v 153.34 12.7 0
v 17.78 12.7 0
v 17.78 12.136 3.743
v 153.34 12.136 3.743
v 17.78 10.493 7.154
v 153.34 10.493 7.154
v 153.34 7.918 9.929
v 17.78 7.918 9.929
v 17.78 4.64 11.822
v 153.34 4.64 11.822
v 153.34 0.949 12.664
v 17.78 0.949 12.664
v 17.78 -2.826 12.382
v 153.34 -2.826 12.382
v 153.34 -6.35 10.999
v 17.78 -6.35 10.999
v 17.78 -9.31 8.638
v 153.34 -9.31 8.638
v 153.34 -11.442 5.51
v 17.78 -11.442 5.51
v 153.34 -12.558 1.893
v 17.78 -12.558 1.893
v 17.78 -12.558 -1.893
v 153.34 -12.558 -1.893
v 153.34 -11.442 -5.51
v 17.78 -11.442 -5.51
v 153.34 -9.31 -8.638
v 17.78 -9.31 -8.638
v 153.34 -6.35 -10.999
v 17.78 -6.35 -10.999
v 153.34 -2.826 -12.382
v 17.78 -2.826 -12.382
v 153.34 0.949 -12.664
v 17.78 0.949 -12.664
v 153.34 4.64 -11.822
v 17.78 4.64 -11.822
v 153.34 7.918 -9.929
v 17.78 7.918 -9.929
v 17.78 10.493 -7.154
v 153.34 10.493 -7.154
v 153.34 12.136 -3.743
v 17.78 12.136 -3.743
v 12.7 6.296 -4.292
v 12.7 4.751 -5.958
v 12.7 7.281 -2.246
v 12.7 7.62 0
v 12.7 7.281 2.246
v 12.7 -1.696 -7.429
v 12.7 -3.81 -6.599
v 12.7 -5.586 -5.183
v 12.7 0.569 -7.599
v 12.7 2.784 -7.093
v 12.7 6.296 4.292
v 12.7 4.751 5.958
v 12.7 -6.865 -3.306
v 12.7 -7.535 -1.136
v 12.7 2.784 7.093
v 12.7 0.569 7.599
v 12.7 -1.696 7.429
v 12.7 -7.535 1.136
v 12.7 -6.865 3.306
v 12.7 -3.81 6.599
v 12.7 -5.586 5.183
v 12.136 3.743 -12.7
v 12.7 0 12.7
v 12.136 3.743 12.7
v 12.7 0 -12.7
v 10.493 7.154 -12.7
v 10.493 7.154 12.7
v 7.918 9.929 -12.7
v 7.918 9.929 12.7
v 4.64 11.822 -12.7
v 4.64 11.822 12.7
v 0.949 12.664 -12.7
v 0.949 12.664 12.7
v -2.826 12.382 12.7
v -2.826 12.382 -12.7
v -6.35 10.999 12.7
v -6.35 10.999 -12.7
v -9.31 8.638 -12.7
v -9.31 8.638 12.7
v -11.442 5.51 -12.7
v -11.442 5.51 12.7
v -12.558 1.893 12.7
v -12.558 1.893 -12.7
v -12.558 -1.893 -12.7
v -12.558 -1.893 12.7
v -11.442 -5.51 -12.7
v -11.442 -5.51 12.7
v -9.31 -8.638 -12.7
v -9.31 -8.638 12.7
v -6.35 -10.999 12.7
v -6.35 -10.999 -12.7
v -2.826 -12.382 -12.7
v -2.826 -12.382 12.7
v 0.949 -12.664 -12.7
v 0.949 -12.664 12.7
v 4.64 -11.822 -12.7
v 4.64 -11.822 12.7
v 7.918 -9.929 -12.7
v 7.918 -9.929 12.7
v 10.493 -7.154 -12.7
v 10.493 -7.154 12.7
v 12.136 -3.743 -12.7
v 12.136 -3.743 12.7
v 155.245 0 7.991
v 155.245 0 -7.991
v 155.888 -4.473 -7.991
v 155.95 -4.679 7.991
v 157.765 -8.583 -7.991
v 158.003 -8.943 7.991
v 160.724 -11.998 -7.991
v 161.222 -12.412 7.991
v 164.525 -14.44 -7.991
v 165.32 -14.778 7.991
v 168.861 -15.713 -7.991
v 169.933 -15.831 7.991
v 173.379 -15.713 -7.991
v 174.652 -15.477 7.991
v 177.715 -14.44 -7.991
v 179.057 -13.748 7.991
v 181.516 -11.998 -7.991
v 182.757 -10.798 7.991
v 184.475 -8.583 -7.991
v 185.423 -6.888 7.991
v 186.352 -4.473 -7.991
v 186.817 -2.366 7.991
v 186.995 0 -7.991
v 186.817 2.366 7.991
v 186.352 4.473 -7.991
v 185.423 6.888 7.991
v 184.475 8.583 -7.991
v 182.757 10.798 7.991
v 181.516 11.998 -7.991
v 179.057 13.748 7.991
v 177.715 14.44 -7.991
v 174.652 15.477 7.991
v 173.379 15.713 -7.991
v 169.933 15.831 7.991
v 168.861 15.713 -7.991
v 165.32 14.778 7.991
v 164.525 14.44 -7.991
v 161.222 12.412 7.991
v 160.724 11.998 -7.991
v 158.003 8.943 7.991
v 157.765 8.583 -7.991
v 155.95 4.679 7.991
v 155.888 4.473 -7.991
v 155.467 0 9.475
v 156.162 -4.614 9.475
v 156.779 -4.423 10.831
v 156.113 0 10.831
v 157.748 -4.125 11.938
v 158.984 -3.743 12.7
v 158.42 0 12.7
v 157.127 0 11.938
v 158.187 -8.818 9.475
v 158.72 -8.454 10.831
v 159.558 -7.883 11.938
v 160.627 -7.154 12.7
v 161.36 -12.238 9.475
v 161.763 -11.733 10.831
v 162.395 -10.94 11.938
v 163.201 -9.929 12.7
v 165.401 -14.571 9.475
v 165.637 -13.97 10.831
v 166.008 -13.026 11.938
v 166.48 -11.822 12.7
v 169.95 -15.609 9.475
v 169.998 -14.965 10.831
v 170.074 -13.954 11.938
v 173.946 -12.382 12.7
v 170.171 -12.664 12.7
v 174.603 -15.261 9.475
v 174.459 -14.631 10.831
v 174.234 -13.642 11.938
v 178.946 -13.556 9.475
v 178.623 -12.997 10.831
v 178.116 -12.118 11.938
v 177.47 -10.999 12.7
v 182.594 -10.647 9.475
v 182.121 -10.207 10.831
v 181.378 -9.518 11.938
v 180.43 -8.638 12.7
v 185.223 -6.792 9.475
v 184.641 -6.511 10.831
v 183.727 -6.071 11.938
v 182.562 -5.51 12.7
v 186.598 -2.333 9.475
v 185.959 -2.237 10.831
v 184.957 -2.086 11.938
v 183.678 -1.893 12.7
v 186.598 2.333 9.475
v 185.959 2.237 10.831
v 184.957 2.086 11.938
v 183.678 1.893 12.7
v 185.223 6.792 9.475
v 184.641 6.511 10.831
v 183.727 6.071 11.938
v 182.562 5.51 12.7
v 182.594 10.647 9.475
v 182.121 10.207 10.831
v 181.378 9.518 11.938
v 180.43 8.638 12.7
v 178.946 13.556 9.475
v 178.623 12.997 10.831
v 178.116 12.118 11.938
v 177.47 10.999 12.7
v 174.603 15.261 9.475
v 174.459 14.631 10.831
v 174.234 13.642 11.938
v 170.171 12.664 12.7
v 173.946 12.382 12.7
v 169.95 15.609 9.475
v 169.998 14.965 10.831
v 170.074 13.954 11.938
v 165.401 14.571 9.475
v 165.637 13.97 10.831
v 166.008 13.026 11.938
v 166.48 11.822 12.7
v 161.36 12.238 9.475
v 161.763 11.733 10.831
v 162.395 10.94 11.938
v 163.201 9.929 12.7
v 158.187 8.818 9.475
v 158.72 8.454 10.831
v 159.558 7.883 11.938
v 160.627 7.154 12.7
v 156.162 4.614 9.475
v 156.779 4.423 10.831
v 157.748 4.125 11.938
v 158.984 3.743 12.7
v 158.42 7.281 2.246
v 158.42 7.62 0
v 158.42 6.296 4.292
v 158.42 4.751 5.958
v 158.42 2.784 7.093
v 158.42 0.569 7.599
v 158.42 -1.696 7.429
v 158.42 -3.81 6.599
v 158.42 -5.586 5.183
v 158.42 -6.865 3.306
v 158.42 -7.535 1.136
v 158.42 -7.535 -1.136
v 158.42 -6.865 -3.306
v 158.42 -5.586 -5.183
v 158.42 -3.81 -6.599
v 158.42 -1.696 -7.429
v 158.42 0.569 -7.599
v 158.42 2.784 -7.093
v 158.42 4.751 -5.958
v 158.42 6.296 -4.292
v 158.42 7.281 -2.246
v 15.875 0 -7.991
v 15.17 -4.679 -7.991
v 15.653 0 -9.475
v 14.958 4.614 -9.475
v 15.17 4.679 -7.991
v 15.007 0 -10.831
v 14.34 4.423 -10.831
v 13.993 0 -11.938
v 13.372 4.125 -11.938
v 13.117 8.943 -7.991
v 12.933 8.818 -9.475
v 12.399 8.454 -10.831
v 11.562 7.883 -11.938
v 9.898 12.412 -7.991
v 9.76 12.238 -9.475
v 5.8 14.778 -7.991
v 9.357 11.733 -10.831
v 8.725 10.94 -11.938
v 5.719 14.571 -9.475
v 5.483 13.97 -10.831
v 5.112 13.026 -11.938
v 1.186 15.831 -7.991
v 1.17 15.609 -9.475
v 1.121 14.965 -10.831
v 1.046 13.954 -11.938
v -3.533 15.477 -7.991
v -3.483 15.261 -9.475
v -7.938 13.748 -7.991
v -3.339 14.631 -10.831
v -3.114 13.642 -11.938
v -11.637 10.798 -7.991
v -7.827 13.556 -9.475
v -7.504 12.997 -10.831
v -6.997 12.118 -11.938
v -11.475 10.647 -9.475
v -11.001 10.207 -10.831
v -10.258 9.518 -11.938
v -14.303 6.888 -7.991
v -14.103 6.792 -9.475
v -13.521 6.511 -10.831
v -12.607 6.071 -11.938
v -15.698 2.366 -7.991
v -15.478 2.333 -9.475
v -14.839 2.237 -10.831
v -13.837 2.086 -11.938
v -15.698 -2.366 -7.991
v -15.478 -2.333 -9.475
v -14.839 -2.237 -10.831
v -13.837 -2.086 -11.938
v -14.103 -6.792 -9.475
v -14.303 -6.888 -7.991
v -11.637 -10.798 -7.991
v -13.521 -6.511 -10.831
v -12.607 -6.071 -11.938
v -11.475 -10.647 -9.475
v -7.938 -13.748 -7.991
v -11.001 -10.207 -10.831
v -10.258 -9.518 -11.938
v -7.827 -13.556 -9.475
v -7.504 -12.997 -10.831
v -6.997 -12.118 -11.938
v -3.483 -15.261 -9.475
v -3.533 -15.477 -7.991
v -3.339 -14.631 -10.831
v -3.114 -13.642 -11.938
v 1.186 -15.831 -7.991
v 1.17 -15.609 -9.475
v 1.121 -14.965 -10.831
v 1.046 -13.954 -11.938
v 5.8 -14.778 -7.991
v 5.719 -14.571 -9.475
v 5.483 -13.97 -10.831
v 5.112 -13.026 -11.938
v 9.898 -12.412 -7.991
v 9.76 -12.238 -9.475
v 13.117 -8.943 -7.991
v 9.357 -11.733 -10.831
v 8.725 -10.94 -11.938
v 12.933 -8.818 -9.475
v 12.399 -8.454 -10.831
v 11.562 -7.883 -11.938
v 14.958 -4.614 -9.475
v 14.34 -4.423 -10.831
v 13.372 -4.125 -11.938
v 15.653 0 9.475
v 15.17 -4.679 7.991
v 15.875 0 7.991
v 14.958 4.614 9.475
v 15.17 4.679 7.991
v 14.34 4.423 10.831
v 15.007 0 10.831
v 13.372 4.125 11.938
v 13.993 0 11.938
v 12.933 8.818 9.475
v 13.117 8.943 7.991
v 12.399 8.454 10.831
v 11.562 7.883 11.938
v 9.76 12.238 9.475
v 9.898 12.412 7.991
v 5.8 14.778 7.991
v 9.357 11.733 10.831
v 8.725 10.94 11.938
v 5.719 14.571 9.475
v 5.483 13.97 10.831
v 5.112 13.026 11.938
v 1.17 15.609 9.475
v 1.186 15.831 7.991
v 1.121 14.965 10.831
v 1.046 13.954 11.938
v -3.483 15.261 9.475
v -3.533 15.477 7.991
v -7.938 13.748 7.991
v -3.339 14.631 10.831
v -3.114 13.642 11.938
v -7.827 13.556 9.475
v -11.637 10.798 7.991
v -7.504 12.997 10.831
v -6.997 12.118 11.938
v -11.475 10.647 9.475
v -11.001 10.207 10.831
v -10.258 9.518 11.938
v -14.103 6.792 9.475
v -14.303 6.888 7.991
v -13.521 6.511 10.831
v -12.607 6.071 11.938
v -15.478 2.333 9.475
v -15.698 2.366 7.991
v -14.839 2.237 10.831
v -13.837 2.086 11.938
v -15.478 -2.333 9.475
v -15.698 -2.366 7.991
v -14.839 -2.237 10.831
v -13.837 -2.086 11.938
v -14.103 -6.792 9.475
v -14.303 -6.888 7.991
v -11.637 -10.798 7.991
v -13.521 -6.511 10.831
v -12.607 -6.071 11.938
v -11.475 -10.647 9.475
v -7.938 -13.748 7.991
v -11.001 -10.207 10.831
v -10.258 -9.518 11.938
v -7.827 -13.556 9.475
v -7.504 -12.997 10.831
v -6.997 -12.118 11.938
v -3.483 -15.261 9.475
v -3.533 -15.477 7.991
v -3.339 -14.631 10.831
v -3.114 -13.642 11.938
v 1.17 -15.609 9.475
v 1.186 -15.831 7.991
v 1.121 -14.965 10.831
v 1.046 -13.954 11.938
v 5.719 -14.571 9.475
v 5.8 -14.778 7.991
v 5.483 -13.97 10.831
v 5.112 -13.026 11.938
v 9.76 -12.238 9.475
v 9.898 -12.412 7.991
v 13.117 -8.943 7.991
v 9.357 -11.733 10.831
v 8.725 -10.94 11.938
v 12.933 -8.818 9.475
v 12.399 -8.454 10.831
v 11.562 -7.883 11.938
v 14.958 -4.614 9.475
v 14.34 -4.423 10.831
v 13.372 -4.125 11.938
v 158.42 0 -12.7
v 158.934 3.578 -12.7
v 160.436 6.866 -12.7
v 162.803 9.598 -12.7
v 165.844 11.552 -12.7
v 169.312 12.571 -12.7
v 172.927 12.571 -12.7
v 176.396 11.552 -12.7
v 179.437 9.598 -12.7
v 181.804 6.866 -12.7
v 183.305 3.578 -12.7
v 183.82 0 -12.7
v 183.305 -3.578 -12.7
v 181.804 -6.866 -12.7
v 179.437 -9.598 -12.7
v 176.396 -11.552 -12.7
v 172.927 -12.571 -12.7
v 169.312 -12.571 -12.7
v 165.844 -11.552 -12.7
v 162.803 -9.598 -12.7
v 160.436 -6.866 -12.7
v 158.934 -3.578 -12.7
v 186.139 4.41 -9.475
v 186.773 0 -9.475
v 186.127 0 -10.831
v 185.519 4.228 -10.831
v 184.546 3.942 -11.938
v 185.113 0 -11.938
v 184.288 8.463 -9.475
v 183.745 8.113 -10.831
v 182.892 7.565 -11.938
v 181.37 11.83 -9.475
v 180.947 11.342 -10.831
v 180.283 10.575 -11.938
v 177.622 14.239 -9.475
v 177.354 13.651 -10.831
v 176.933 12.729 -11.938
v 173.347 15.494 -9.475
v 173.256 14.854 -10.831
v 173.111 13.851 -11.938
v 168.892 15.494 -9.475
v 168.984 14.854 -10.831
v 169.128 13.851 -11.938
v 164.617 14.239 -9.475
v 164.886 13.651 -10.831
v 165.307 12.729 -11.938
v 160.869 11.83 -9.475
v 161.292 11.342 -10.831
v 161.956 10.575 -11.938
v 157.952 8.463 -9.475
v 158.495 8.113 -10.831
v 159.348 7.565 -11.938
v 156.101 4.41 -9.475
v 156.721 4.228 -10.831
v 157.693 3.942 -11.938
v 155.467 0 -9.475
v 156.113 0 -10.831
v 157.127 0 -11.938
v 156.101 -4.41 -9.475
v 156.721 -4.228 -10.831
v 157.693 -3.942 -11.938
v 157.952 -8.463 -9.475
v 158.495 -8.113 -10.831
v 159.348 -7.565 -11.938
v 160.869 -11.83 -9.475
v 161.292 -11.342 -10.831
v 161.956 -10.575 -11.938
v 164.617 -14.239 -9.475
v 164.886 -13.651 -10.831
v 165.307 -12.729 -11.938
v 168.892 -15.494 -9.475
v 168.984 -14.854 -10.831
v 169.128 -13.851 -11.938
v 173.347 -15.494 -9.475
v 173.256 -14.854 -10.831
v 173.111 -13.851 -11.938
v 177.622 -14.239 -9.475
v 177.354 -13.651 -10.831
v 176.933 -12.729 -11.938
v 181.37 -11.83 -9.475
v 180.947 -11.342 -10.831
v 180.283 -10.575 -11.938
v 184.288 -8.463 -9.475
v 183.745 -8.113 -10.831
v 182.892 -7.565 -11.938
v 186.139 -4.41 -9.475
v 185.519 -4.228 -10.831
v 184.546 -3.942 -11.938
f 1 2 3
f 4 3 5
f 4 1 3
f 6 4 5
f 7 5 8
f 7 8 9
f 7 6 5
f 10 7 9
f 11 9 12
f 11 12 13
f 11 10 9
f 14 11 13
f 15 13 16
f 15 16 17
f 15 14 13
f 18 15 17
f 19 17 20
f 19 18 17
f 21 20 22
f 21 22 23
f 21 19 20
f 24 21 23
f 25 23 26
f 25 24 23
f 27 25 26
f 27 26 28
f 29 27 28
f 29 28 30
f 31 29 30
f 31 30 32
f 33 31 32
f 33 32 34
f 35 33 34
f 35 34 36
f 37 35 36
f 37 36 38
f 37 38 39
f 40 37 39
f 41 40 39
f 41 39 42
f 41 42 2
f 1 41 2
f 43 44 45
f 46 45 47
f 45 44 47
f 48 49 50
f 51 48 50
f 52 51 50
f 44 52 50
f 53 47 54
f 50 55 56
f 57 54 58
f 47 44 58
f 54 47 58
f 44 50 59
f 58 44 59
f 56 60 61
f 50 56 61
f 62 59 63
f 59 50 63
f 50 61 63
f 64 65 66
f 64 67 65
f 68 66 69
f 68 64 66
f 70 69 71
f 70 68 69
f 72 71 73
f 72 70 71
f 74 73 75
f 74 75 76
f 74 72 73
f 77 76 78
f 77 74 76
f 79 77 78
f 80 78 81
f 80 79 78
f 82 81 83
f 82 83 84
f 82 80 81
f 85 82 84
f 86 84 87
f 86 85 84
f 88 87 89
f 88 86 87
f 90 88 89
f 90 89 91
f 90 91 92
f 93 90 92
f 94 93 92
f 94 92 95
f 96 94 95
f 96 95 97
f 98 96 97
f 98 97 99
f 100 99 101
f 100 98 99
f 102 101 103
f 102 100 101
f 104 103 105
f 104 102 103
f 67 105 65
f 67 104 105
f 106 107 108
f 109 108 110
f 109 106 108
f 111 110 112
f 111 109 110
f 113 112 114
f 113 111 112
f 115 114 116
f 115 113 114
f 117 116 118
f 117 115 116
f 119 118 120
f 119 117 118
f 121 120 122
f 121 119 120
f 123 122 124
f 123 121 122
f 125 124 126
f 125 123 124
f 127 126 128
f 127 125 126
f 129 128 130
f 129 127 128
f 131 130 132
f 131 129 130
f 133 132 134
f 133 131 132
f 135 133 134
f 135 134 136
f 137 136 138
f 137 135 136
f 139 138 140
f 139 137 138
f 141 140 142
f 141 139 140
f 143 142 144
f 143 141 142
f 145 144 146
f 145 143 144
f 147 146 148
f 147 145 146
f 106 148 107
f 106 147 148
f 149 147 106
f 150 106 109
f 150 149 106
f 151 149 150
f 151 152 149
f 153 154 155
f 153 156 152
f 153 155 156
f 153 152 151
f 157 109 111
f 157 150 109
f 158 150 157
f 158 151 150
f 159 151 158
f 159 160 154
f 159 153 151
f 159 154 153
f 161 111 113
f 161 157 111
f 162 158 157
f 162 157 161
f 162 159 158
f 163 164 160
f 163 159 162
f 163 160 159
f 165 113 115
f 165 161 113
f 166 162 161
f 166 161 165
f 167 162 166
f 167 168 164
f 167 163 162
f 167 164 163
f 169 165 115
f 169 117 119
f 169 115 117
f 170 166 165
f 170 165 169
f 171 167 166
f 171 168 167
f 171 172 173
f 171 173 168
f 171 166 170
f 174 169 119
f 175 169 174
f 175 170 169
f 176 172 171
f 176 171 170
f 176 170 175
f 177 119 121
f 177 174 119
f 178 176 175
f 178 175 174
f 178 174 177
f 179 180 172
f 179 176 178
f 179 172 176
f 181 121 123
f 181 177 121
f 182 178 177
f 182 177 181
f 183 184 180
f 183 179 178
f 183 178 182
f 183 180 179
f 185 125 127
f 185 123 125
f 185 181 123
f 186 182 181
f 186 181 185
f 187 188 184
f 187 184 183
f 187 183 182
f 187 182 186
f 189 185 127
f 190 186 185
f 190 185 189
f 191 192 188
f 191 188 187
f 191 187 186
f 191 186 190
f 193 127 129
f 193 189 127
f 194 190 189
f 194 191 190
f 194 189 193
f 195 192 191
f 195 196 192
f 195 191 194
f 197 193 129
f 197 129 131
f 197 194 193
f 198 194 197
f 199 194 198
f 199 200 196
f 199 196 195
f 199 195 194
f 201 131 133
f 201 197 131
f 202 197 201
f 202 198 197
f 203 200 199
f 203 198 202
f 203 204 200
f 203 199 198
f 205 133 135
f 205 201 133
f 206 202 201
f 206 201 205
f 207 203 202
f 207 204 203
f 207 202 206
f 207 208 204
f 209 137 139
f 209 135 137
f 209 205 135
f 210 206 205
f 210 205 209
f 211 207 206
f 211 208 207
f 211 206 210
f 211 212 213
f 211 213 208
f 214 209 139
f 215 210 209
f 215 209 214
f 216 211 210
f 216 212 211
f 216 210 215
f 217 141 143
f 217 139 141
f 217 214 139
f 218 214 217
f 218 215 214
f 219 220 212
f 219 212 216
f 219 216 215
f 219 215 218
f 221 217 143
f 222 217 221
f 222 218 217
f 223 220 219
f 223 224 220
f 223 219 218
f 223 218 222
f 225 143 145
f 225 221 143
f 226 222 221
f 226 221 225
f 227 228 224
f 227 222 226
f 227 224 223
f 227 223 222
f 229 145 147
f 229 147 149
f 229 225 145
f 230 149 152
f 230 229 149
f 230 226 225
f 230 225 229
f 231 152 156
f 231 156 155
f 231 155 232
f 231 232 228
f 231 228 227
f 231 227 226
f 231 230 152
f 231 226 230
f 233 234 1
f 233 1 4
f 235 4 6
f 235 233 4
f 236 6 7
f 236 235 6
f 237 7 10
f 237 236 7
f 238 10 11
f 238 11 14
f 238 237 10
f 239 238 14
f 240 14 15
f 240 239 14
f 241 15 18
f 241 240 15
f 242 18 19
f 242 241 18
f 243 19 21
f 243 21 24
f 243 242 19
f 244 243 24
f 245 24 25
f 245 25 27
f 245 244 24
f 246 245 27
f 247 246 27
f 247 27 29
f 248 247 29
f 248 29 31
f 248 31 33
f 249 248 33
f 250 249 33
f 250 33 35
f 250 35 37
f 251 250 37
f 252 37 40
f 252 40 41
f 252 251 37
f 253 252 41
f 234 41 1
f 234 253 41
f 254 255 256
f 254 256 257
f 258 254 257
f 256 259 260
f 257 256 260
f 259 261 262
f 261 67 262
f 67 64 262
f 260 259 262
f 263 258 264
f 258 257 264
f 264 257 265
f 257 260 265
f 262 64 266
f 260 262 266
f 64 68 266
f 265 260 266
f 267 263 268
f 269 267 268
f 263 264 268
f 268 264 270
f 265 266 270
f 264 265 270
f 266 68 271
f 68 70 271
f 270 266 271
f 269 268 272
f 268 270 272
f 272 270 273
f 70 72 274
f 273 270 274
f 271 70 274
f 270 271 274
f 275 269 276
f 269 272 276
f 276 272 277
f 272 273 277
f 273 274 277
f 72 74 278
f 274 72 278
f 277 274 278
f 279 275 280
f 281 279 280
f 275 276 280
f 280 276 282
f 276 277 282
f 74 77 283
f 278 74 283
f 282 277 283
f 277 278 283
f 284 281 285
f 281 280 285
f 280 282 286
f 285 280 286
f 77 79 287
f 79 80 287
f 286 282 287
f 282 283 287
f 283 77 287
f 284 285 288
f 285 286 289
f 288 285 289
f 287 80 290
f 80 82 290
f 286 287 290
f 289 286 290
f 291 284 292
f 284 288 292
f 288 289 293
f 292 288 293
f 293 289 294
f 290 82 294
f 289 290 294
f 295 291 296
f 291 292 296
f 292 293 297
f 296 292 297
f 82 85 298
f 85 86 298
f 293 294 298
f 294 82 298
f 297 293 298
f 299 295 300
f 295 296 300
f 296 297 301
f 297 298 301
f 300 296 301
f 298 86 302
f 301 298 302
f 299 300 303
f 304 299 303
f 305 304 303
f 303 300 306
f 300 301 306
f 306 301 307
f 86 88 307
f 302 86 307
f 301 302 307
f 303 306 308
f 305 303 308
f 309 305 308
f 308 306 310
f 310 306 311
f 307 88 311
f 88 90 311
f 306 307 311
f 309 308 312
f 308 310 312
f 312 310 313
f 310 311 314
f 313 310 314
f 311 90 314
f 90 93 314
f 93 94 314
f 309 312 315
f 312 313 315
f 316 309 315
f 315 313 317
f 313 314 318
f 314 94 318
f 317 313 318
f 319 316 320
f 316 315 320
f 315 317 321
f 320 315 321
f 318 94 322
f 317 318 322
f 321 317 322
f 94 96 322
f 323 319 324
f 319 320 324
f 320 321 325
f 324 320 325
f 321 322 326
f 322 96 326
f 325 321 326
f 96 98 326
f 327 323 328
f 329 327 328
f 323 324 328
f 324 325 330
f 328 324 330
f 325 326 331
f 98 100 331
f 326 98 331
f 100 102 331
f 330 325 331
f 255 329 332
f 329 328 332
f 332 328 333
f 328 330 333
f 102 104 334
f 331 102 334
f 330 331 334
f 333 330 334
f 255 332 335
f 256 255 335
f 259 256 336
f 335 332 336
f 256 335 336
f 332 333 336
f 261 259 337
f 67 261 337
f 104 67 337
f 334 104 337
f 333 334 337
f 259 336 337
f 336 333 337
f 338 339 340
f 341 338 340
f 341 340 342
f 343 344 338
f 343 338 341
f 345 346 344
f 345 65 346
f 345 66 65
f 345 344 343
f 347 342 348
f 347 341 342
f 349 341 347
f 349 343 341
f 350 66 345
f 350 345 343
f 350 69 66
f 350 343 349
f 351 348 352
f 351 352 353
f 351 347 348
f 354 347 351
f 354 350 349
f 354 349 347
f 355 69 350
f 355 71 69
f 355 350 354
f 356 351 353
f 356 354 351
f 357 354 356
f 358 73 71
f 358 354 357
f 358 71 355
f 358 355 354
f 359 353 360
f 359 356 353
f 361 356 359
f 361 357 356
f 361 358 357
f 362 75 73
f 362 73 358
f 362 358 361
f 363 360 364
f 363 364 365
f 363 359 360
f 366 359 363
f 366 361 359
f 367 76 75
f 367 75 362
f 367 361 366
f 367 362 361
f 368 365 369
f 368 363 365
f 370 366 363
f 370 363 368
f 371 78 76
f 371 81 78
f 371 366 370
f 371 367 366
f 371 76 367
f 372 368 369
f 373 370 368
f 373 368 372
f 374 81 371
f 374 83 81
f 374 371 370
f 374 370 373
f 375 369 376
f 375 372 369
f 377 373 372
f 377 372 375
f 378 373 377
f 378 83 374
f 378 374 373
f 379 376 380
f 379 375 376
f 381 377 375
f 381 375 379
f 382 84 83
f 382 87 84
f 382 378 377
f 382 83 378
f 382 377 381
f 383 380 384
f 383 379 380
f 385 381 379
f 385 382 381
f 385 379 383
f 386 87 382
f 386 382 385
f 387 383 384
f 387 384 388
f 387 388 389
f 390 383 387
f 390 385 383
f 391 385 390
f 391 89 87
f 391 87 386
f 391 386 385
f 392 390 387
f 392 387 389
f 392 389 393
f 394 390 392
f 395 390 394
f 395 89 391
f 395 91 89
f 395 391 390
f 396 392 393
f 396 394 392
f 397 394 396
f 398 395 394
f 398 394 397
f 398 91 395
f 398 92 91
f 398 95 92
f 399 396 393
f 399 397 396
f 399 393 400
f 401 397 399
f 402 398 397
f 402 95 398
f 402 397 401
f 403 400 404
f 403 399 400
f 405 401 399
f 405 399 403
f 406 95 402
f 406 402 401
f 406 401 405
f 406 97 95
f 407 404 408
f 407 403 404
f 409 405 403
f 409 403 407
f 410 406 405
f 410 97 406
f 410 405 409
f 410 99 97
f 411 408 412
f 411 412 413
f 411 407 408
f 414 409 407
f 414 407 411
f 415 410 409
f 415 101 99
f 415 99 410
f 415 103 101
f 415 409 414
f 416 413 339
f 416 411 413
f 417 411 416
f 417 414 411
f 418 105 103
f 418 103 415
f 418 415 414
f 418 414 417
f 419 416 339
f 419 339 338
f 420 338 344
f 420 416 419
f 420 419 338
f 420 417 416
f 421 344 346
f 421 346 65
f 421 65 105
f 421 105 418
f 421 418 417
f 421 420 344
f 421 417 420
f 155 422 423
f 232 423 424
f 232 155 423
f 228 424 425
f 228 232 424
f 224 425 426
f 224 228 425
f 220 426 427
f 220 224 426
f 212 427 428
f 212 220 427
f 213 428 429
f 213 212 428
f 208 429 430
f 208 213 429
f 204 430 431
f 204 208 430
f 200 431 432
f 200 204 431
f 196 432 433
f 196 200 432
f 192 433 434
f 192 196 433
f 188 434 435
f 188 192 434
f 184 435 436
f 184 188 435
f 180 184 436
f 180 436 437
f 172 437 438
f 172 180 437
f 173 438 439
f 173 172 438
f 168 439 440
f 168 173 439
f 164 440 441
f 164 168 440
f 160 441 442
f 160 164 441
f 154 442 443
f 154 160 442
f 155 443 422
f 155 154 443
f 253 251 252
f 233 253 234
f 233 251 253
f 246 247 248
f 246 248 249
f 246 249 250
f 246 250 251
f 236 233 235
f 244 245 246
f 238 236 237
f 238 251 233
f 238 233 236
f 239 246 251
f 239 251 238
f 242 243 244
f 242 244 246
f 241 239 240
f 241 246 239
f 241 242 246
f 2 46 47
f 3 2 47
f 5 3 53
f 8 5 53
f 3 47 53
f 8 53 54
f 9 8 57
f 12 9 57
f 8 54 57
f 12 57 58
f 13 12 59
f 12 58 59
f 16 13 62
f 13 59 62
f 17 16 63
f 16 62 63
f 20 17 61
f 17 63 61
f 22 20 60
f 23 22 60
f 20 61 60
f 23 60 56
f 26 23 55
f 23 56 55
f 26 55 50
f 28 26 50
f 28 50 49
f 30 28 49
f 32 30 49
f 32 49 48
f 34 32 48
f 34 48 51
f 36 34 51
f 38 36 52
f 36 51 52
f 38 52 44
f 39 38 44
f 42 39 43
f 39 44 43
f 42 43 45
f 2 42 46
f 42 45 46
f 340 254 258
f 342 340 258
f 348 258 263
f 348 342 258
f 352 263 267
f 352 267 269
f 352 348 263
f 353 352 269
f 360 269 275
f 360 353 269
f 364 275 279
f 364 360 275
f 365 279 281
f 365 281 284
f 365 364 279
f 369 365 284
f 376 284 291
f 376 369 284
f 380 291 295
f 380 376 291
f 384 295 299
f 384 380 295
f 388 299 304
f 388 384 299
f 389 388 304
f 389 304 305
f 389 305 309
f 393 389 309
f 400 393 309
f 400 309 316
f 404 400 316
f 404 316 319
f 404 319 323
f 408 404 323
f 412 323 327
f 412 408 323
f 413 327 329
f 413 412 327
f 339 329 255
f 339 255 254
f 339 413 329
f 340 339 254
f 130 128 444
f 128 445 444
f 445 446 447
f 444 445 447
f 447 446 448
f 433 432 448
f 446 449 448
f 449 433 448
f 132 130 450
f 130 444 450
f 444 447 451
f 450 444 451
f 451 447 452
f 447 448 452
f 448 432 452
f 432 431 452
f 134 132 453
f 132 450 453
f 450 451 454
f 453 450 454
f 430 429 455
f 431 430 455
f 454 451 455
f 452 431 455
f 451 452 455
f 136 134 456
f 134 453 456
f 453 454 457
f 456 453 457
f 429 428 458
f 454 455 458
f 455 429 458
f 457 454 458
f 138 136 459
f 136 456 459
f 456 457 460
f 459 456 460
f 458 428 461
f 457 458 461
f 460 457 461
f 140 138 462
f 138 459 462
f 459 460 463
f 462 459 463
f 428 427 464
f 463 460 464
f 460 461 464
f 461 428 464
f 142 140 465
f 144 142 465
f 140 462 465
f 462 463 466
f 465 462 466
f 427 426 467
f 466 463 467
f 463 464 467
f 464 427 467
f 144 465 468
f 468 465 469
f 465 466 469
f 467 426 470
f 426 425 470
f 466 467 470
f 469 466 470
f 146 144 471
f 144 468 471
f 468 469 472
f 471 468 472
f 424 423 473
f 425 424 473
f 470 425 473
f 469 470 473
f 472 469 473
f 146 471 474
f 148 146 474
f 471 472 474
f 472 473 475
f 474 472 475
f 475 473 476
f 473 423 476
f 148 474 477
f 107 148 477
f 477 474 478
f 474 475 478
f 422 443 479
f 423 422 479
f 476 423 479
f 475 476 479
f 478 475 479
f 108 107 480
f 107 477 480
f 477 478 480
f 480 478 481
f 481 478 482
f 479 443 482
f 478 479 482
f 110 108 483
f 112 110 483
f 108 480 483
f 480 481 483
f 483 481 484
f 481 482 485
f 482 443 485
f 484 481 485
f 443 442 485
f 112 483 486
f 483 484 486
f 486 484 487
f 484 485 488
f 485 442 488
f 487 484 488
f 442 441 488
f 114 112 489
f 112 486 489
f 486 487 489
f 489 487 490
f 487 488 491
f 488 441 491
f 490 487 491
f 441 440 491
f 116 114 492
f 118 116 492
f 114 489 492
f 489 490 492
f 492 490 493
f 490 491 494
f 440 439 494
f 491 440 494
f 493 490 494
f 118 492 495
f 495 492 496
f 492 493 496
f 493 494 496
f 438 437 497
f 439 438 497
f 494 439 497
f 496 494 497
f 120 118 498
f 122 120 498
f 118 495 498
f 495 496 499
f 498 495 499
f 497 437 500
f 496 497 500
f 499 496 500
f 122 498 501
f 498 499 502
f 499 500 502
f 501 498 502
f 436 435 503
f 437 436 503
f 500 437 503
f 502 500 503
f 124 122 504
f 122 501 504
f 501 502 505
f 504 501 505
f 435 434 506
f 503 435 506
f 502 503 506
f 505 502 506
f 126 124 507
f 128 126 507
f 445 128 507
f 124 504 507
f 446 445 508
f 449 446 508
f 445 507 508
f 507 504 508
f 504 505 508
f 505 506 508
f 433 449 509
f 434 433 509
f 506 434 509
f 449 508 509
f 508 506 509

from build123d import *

# Parameters (mm, degrees)
F0_R          = 15.875
F0_R_2        = 12.7
F1_DEPTH      = 12.7
F3_R          = 12.7
F5_2_T2_ANGLE = 180
F5_2_T4_ANGLE = 180
F5_2_T6_ANGLE = 180
F5_2_T8_ANGLE = 180
F6_SIZE       = 5.08


# Not quite as in the source:
# - a fillet or chamfer that OpenCascade refuses, or shapes differently, is made with other operations: its cross-section is extruded or revolved along the edge and cut away or added


with BuildPart() as f1:
    # F0 (on Top) → F1 (new body, symmetric)
    with BuildSketch(Plane.XY):
        Circle(F0_R)
        Circle(F0_R_2, mode=Mode.SUBTRACT)
    extrude(amount=F1_DEPTH, both=True)

    # F5: fillet of radius 5.08 on 2 edges, made by hand

    # F5_s1 → F5_t2 (revolve, cut)
    with BuildSketch(Plane.XZ):
        with BuildLine():
            ThreePointArc((15.875, 7.9907139607), (15.0071134838, 10.8305202921), (12.7, 12.7))
            Line((12.7, 12.7), (15.875, 12.7))
            Line((15.875, 12.7), (15.875, 7.9907139607))
        make_face()
    revolve(axis=Axis((0, 0, 12.7), (0, 0, 1)), mode=Mode.SUBTRACT)

    # F5_s3 → F5_t4 (revolve, cut)
    with BuildSketch(Plane.XZ):
        with BuildLine():
            ThreePointArc((15.875, -7.9907139607), (15.0071134838, -10.8305202921), (12.7, -12.7))
            Line((12.7, -12.7), (15.875, -12.7))
            Line((15.875, -12.7), (15.875, -7.9907139607))
        make_face()
    revolve(axis=Axis((0, 0, -12.7), (0, 0, 1)), mode=Mode.SUBTRACT)


with BuildPart() as f1b:
    # F0 (on Top) → F1, piece 2 (new body, symmetric)
    with BuildSketch(Plane.XY):
        with BuildLine():
            ThreePointArc((186.9948, 0), (171.1198, 15.875), (155.2448, 0))
            ThreePointArc((155.2448, 0), (171.1198, -15.875), (186.9948, 0))
        make_face()
        with BuildLine():
            ThreePointArc((183.8198, 0), (171.1198, -12.7), (158.4198, 0))
            ThreePointArc((158.4198, 0), (171.1198, 12.7), (183.8198, 0))
        make_face(mode=Mode.SUBTRACT)
    extrude(amount=F1_DEPTH, both=True)

    # F5#2: fillet of radius 5.08 on 4 edges, made by hand

    # F5_2_s1 → F5_2_t2 (revolve, cut)
    with BuildSketch(Plane.XZ):
        with BuildLine():
            ThreePointArc((186.9948, 7.9907139607), (186.1269134838, 10.8305202921), (183.8198, 12.7))
            Line((183.8198, 12.7), (186.9948, 12.7))
            Line((186.9948, 12.7), (186.9948, 7.9907139607))
        make_face()
    revolve(axis=Axis((171.1198, 0, 12.7), (0, 0, 1)), revolution_arc=F5_2_T2_ANGLE, mode=Mode.SUBTRACT)

    # F5_2_s3 → F5_2_t4 (revolve, cut)
    with BuildSketch(Plane.XZ):
        with BuildLine():
            ThreePointArc((155.2448, 7.9907139607), (156.1126865162, 10.8305202921), (158.4198, 12.7))
            Line((158.4198, 12.7), (155.2448, 12.7))
            Line((155.2448, 12.7), (155.2448, 7.9907139607))
        make_face()
    revolve(axis=Axis((171.1198, 0, 12.7), (0, 0, 1)), revolution_arc=F5_2_T4_ANGLE, mode=Mode.SUBTRACT)

    # F5_2_s5 → F5_2_t6 (revolve, cut)
    with BuildSketch(Plane.XZ):
        with BuildLine():
            ThreePointArc((186.9948, -7.9907139607), (186.1269134838, -10.8305202921), (183.8198, -12.7))
            Line((183.8198, -12.7), (186.9948, -12.7))
            Line((186.9948, -12.7), (186.9948, -7.9907139607))
        make_face()
    revolve(axis=Axis((171.1198, 0, -12.7), (0, 0, 1)), revolution_arc=F5_2_T6_ANGLE, mode=Mode.SUBTRACT)

    # F5_2_s7 → F5_2_t8 (revolve, cut)
    with BuildSketch(Plane.XZ):
        with BuildLine():
            ThreePointArc((155.2448, -7.9907139607), (156.1126865162, -10.8305202921), (158.4198, -12.7))
            Line((158.4198, -12.7), (155.2448, -12.7))
            Line((155.2448, -12.7), (155.2448, -7.9907139607))
        make_face()
    revolve(axis=Axis((171.1198, 0, -12.7), (0, 0, 1)), revolution_arc=F5_2_T8_ANGLE, mode=Mode.SUBTRACT)


with BuildPart() as f4:
    # F4: sweep along a path in F0
    with BuildLine(Plane.XY) as f4_path:
        Line((12.7, 0), (15.875, 0))
        Line((15.875, 0), (155.2448, 0))
        Line((155.2448, 0), (158.4198, 0))
    # F3 (on offset) → F4 (sweep)
    with BuildSketch(Plane.YZ.offset(12.7)):
        Circle(F3_R)
    sweep(path=f4_path.line)

    # F6
    f6_edges = [f4.edges().sort_by_distance(p)[0] for p in [
        (158.4198, -12.7, 0),
        (12.7, -12.7, 0),
    ]]
    chamfer(f6_edges, length=F6_SIZE)


solid = Compound([f1.part, f1b.part, f4.part])
